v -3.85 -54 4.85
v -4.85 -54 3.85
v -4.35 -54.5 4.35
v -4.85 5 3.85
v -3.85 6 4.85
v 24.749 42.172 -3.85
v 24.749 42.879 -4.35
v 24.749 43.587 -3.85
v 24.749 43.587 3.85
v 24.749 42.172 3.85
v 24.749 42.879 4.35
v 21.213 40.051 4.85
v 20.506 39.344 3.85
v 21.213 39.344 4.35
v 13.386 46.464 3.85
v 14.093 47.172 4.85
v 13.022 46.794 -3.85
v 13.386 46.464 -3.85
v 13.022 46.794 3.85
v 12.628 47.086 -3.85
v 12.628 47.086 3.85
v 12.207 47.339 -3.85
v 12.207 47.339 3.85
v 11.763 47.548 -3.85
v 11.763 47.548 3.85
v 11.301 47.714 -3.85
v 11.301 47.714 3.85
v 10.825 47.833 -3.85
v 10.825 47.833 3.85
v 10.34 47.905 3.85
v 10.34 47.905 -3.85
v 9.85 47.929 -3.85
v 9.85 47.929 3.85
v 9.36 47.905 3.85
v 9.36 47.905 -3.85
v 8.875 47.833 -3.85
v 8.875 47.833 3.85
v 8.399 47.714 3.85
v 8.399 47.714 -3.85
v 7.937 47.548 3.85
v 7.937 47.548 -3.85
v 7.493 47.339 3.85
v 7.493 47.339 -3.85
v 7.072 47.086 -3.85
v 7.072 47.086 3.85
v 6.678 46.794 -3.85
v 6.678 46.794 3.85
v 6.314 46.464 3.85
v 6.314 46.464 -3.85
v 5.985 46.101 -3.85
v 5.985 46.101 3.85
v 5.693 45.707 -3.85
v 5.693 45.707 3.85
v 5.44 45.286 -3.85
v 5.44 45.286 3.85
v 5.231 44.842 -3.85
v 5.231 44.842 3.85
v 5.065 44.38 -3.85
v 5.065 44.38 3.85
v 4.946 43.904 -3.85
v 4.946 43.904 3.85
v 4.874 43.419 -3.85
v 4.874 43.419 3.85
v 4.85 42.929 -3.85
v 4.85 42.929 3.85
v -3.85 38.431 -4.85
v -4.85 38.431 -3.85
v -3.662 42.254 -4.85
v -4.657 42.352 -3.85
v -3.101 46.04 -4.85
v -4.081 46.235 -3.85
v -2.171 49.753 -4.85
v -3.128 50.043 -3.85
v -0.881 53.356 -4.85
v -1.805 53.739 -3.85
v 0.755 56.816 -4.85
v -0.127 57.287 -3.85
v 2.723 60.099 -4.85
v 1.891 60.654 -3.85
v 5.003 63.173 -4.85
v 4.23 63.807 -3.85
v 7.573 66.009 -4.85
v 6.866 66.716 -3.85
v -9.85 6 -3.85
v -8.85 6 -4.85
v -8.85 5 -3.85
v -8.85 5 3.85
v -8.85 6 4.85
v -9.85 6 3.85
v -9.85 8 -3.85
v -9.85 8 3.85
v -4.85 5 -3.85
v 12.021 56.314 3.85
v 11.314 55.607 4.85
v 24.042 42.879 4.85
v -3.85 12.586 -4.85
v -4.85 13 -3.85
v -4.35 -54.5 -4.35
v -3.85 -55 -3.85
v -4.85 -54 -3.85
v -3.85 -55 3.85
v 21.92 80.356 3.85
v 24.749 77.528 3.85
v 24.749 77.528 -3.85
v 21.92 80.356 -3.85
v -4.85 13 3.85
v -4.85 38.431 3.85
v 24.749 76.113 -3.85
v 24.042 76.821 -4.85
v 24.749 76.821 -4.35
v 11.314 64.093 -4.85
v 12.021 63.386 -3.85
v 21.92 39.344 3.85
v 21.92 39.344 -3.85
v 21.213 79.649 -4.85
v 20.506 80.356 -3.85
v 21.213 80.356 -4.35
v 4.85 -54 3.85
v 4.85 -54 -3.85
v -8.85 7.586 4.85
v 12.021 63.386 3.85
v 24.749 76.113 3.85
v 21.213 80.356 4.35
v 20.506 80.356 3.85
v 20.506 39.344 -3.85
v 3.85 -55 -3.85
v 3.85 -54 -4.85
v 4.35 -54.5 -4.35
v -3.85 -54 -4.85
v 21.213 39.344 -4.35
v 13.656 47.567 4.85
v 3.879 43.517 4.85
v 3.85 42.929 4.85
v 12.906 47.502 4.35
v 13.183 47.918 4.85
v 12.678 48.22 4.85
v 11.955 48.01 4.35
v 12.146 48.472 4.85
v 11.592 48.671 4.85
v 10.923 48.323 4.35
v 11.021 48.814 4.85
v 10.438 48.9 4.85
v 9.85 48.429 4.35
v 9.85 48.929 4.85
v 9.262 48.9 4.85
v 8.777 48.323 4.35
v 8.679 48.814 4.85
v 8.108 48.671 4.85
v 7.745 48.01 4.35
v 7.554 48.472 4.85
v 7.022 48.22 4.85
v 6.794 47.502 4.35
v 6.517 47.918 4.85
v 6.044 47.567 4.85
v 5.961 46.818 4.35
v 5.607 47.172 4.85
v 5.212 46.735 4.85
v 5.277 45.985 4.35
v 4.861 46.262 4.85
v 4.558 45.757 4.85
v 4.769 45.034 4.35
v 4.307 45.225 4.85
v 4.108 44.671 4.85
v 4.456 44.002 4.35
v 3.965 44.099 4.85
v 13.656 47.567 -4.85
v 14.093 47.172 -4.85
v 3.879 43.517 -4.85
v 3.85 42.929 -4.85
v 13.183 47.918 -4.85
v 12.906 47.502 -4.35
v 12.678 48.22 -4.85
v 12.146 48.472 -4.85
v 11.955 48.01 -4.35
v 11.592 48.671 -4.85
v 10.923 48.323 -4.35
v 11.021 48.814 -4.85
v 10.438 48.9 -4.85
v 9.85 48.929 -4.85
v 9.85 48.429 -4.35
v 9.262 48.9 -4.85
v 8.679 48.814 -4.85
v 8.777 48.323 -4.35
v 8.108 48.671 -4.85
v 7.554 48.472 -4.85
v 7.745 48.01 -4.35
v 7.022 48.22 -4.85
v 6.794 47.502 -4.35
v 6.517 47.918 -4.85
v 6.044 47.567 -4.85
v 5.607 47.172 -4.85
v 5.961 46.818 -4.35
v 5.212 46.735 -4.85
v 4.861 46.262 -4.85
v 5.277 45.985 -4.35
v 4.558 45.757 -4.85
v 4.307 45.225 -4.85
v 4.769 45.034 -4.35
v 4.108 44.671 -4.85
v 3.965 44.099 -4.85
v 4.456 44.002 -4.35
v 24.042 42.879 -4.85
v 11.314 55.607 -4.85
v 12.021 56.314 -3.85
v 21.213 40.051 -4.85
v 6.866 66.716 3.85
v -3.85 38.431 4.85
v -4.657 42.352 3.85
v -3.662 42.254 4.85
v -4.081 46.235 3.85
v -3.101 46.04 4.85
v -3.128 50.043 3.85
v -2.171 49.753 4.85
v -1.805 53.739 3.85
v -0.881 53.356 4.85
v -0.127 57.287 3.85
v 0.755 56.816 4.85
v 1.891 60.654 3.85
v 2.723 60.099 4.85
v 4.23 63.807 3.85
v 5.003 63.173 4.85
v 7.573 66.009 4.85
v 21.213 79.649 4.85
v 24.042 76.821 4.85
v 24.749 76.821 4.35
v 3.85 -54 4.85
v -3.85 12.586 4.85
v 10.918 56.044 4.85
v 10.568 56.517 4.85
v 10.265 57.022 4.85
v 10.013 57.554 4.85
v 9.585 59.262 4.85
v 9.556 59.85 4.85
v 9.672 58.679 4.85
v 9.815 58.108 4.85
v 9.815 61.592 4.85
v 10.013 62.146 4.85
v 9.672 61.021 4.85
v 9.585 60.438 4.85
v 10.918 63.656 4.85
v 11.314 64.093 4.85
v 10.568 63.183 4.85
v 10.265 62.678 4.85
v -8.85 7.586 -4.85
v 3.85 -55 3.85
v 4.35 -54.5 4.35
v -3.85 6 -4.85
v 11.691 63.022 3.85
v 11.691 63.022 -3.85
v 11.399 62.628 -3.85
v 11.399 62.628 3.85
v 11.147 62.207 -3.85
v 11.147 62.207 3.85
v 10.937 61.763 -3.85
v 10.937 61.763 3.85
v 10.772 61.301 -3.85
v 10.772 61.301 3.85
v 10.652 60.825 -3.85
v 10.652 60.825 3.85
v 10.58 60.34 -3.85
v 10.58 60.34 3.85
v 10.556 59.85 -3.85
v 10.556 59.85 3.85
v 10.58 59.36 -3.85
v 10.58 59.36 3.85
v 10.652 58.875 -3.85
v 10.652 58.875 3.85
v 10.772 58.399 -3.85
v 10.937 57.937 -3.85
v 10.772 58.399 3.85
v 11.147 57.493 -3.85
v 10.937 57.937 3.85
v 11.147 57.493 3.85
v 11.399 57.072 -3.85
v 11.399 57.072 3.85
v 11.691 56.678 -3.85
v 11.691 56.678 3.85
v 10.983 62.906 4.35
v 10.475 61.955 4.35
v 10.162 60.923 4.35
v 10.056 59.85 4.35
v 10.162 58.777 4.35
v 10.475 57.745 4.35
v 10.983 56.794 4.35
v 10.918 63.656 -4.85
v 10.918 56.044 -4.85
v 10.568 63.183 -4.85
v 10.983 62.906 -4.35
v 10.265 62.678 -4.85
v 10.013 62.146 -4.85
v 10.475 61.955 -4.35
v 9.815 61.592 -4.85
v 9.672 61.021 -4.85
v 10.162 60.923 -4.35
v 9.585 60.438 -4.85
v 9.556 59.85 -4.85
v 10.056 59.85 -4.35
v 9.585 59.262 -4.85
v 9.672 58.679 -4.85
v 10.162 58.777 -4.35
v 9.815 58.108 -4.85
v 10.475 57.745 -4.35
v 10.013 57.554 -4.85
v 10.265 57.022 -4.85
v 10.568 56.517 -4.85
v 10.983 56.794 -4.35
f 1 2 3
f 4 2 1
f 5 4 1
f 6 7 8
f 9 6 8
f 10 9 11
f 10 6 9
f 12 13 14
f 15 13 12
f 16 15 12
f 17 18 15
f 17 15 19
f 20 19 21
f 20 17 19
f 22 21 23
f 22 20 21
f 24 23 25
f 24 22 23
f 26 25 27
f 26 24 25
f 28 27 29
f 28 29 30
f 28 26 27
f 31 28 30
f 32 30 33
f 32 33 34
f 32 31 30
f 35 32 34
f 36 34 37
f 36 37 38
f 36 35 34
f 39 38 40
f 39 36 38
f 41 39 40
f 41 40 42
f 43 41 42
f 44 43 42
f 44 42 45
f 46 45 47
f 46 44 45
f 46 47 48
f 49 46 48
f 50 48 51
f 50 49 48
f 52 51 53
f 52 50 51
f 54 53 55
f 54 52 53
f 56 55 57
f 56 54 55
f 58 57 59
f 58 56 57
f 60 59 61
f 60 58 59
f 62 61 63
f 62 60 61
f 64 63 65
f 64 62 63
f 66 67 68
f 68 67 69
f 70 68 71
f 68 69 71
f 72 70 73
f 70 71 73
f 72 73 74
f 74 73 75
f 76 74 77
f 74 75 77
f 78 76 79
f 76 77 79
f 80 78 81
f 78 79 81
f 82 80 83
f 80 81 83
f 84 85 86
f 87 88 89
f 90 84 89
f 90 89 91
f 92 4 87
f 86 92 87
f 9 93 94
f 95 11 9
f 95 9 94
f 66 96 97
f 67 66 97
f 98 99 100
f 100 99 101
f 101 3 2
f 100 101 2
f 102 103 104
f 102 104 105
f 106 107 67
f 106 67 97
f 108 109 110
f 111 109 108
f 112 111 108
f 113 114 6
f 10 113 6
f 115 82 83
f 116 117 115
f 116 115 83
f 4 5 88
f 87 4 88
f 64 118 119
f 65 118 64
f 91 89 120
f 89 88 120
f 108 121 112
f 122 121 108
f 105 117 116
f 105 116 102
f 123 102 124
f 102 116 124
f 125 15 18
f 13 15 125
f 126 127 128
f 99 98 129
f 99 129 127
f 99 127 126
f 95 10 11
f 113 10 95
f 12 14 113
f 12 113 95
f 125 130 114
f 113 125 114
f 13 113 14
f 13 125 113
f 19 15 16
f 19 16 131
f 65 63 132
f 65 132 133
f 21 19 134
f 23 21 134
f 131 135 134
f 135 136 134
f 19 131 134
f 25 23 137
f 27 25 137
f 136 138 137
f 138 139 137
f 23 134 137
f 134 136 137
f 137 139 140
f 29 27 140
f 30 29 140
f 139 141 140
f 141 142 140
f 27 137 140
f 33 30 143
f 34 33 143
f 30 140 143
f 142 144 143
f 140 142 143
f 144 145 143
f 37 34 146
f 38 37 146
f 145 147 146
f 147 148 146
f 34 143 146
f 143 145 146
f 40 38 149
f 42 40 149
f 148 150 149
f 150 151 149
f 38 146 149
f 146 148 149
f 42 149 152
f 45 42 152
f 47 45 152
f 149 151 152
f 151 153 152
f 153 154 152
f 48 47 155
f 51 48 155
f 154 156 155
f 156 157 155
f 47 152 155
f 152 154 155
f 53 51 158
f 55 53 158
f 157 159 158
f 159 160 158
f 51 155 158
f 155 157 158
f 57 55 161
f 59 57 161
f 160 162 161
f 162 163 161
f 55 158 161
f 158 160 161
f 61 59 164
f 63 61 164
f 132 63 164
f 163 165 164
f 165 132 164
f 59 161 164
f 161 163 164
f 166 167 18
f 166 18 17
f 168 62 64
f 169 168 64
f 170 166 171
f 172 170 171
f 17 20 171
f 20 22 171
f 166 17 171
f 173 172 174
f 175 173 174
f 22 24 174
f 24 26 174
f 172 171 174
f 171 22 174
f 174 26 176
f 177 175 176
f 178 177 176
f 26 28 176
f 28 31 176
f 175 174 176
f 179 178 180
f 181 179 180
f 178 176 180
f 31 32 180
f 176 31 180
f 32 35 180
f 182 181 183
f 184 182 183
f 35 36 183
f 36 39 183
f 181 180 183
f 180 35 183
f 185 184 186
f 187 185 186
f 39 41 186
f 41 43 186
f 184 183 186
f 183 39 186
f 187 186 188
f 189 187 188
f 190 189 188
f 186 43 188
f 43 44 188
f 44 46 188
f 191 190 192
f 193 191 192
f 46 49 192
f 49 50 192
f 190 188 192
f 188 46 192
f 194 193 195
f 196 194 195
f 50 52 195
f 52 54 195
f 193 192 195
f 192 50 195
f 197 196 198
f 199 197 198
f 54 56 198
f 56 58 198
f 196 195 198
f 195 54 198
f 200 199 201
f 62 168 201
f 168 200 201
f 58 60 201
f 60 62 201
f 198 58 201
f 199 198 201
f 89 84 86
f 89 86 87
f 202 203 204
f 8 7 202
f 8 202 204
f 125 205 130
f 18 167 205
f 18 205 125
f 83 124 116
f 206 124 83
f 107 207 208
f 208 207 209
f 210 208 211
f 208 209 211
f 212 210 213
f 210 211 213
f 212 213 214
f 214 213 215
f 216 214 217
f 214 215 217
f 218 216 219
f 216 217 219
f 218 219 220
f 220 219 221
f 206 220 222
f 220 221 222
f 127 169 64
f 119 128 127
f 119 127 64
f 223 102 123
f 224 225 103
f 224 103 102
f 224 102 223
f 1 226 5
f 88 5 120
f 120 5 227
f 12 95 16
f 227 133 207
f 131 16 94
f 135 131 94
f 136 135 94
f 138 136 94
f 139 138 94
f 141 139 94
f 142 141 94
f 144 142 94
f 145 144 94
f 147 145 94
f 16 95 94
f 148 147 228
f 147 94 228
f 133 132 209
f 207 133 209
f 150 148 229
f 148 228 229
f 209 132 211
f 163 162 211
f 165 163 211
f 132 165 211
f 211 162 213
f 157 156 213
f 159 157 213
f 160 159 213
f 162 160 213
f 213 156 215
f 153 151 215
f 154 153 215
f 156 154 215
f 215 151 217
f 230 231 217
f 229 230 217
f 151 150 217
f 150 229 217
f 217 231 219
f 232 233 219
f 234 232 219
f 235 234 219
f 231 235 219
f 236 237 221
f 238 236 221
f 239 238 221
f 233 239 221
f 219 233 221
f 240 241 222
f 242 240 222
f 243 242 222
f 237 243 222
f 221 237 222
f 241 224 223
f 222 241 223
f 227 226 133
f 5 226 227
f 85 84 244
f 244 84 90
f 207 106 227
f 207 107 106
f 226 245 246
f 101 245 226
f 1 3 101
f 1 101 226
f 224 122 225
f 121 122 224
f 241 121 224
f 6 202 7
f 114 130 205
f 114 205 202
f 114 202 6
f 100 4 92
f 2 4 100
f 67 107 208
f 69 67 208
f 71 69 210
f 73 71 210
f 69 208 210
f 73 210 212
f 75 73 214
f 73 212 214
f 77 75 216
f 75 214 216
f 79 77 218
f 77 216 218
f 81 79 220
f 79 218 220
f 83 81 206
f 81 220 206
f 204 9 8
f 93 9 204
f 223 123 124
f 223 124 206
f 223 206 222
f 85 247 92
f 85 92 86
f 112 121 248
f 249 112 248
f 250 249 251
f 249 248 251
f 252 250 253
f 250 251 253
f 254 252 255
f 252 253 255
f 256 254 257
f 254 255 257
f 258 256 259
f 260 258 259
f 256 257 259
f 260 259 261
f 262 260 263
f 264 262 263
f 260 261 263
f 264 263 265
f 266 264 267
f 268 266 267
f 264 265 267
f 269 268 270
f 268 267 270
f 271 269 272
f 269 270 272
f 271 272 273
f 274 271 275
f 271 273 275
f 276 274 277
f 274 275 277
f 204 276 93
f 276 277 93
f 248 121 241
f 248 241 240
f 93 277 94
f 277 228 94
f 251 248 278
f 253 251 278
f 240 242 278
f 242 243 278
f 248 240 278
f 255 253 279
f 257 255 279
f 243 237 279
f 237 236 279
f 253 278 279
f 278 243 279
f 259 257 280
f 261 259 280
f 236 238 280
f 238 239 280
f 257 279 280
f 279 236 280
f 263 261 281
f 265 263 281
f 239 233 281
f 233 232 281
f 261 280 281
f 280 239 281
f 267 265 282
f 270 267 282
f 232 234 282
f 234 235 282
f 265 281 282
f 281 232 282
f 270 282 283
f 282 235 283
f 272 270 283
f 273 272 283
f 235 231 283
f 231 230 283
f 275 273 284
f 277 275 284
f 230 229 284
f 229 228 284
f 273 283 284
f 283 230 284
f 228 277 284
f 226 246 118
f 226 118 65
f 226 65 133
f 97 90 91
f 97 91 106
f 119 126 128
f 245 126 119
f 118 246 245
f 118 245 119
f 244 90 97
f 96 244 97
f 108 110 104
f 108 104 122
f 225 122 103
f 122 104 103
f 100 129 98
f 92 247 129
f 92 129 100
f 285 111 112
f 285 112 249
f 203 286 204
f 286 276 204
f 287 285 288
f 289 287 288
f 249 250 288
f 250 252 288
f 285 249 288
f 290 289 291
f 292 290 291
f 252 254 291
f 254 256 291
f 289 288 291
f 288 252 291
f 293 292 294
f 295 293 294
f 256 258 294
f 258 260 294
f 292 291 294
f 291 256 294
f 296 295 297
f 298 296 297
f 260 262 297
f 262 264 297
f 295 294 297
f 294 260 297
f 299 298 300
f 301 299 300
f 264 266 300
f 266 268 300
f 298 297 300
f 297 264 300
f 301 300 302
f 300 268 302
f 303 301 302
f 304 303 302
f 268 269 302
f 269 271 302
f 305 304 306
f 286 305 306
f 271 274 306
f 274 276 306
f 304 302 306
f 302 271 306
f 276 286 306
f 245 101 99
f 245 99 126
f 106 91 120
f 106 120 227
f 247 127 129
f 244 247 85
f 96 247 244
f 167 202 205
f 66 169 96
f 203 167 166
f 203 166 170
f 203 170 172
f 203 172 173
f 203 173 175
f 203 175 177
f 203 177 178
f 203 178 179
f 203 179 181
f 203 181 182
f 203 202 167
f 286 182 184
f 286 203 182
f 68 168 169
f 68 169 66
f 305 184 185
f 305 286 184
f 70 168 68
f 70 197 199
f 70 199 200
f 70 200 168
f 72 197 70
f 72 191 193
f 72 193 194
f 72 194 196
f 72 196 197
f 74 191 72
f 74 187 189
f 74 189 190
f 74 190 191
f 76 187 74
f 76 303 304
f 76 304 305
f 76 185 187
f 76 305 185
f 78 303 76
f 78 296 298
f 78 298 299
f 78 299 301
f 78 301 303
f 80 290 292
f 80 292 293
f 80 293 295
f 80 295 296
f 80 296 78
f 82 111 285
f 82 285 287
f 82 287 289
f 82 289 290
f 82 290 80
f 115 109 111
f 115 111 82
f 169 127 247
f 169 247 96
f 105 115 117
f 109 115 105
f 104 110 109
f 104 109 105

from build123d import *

# Parameters (mm, degrees)
BOSS_EXTRUDE1_DEPTH = 4.85
FILLET1_R           = 5
FILLET2_R           = 40
FILLET3_R           = 5
CHAMFER1_SIZE       = 1
CHAMFER2_SIZE       = 1
CHAMFER3_SIZE       = 1
BOSS_EXTRUDE2_START = -9.7
BOSS_EXTRUDE2_DEPTH = 9.7
CHAMFER4_SIZE       = 1


with BuildPart() as part:
    # Sketch1 → Boss-Extrude1 (new, symmetric)
    with BuildSketch(Plane.XY):
        Polygon((4.85, 55), (21.213203436, 38.636796564), (25.455844123, 42.879437252), (8.485281374, 59.85), (25.455844123, 76.820562748), (21.213203436, 81.063203436), (-4.85, 55), (-4.85, -55), (4.85, -55), align=None)
    extrude(amount=BOSS_EXTRUDE1_DEPTH, both=True)

    # Fillet1
    fillet1_edges = [part.edges().sort_by_distance(p)[0] for p in [
        (4.85, 55, 0),
    ]]
    fillet(fillet1_edges, radius=FILLET1_R)

    # Fillet2
    fillet2_edges = [part.edges().sort_by_distance(p)[0] for p in [
        (-4.85, 55, 0),
    ]]
    fillet(fillet2_edges, radius=FILLET2_R)

    # Fillet3
    fillet3_edges = [part.edges().sort_by_distance(p)[0] for p in [
        (8.485281374, 59.85, 0),
    ]]
    fillet(fillet3_edges, radius=FILLET3_R)

    # Chamfer1
    chamfer1_edges = [part.edges().sort_by_distance(p)[0] for p in [
        (21.213203436, 81.063203436, 0),
        (25.455844123, 76.820562748, 0),
        (25.455844123, 42.879437252, 0),
        (21.213203436, 38.636796564, 0),
    ]]
    chamfer(chamfer1_edges, length=CHAMFER1_SIZE)

    # Chamfer2
    # the kernel refuses this chamfer: 1 mm, written as the material it takes off along each edge
    with BuildSketch(Plane(origin=(-4.85, 38.431457505, -4.85), x_dir=(0.9996219169112968, 0, -0.027495876610586487), z_dir=(0, -1, 0)), Plane(origin=(-4.85, 38.431457505, 4.85), x_dir=(-0.027495876610586487, 0, -0.9996219169112968), z_dir=(0, -1, 0))) as chamfer2_piece_1:
        Polygon((CHAMFER2_SIZE * 0.999621916911, CHAMFER2_SIZE * 0.0274958766106), (-CHAMFER2_SIZE * 0.0274958766106, CHAMFER2_SIZE * 0.999621916911), (0, 0), align=None)
    extrude(amount=96.003140493, mode=Mode.SUBTRACT)
    with BuildSketch(Plane(origin=(35.15, 38.431457505, -4.85), x_dir=(-1, 0, 0), z_dir=(0, -1, 0))) as chamfer2_piece_2:
        Polygon((40 - CHAMFER2_SIZE, 0), (40, -CHAMFER2_SIZE), (40, 0), align=None)
    revolve(axis=Axis((35.15, 38.431457505, -4.85), (0, 0, -1)), revolution_arc=45, mode=Mode.SUBTRACT)
    with BuildSketch(Plane(origin=(22.324551134, 82.174551134, -4.85), x_dir=(0.7068394360706736, -0.7068394360706733, -0.027495876610586494), z_dir=(-0.7071067811865475, -0.7071067811865477, 0)), Plane(origin=(22.324551134, 82.174551134, 4.85), x_dir=(-0.019442520806010343, 0.019442520806010336, -0.999621916911297), z_dir=(-0.7071067811865475, -0.7071067811865477, 0))) as chamfer2_piece_3:
        Polygon((CHAMFER2_SIZE * 0.999621916911, CHAMFER2_SIZE * 0.0274958766106), (-CHAMFER2_SIZE * 0.0274958766106, CHAMFER2_SIZE * 0.999621916911), (0, 0), align=None)
    extrude(amount=21.862076271, mode=Mode.SUBTRACT)
    with BuildSketch(Plane(origin=(26.567191821, 75.70921505, -4.85), x_dir=(-0.7068394360706752, -0.7068394360706718, -0.02749587661058676), z_dir=(-0.7071067811865458, 0.7071067811865493, 0)), Plane(origin=(26.567191821, 75.70921505, 4.85), x_dir=(0.019442520806010388, 0.019442520806010295, -0.999621916911297), z_dir=(-0.7071067811865458, 0.7071067811865493, 0)), Plane(origin=(20.101855737, 37.525448866, -4.85), x_dir=(-0.7068394360706738, 0.7068394360706732, -0.027495876610586494), z_dir=(0.7071067811865472, 0.7071067811865478, 0)), Plane(origin=(20.101855737, 37.525448866, 4.85), x_dir=(0.019442520806015523, -0.01944252080601551, -0.9996219169112968), z_dir=(0.7071067811865472, 0.7071067811865478, 0))) as chamfer2_piece_4:
        Polygon((CHAMFER2_SIZE * 0.999621916911, CHAMFER2_SIZE * 0.0274958766106), (-CHAMFER2_SIZE * 0.0274958766106, CHAMFER2_SIZE * 0.999621916911), (0, 0), align=None)
    extrude(amount=9.143365976, mode=Mode.SUBTRACT)
    with BuildSketch(Plane(origin=(35.15, 38.431457505, 4.85), x_dir=(-1, 0, 0), z_dir=(0, -1, 0))) as chamfer2_piece_5:
        Polygon((40, CHAMFER2_SIZE), (40 - CHAMFER2_SIZE, 0), (40, 0), align=None)
    revolve(axis=Axis((35.15, 38.431457505, 4.85), (0, 0, -1)), revolution_arc=45, mode=Mode.SUBTRACT)
    with BuildSketch(Plane(origin=(12.02081528, 63.385533906, 4.85), x_dir=(0.019442520806015513, -0.01944252080601552, -0.9996219169112968), z_dir=(0.7071067811865476, 0.7071067811865475, 0)), Plane(origin=(26.567191821, 41.768089553, 4.85), x_dir=(0.019442520806015516, 0.019442520806015516, -0.9996219169112968), z_dir=(-0.7071067811865476, 0.7071067811865476, 0)), Plane(origin=(12.02081528, 63.385533906, -4.85), x_dir=(-0.7068394360706736, 0.7068394360706736, -0.027495876610586462), z_dir=(0.7071067811865476, 0.7071067811865475, 0)), Plane(origin=(26.567191821, 41.768089553, -4.85), x_dir=(-0.7068394360706735, -0.7068394360706735, -0.027495876610586494), z_dir=(-0.7071067811865476, 0.7071067811865476, 0))) as chamfer2_piece_6:
        Polygon((CHAMFER2_SIZE * 0.999621916911, CHAMFER2_SIZE * 0.0274958766106), (-CHAMFER2_SIZE * 0.0274958766106, CHAMFER2_SIZE * 0.999621916911), (0, 0), align=None)
    extrude(amount=20.571682988, mode=Mode.SUBTRACT)
    with BuildSketch(Plane(origin=(15.556349186, 59.85, 4.85), x_dir=(-0.7071067811865474, 0.7071067811865477, 0), z_dir=(0.7071067811865477, 0.7071067811865474, 0))) as chamfer2_piece_7:
        Polygon((5, -CHAMFER2_SIZE), (5 + CHAMFER2_SIZE, 0), (5, 0), align=None)
    revolve(axis=Axis((15.556349186, 59.85, 4.85), (0, 0, 1)), revolution_arc=90, mode=Mode.SUBTRACT)
    with BuildSketch(Plane(origin=(15.556349186, 59.85, -4.85), x_dir=(-0.7071067811865474, 0.7071067811865477, 0), z_dir=(0.7071067811865477, 0.7071067811865474, 0))) as chamfer2_piece_8:
        Polygon((5 + CHAMFER2_SIZE, 0), (5, CHAMFER2_SIZE), (5, 0), align=None)
    revolve(axis=Axis((15.556349186, 59.85, -4.85), (0, 0, 1)), revolution_arc=90, mode=Mode.SUBTRACT)
    with BuildSketch(Plane(origin=(13.385533906, 46.464466094, -4.85), x_dir=(0.7068394360706735, 0.7068394360706737, -0.027495876610586462), z_dir=(0.7071067811865477, -0.7071067811865474, 0)), Plane(origin=(13.385533906, 46.464466094, 4.85), x_dir=(-0.019442520806016373, -0.01944252080601638, -0.9996219169112965), z_dir=(0.7071067811865477, -0.7071067811865474, 0))) as chamfer2_piece_9:
        Polygon((CHAMFER2_SIZE * 0.999621916911, CHAMFER2_SIZE * 0.0274958766106), (-CHAMFER2_SIZE * 0.0274958766106, CHAMFER2_SIZE * 0.999621916911), (0, 0), align=None)
    extrude(amount=12.641679399, mode=Mode.SUBTRACT)
    with BuildSketch(Plane(origin=(9.85, 42.928932188, -4.85), x_dir=(0.7071067811865479, 0.7071067811865471, 0), z_dir=(0.7071067811865471, -0.7071067811865479, 0))) as chamfer2_piece_10:
        Polygon((5 + CHAMFER2_SIZE, 0), (5, CHAMFER2_SIZE), (5, 0), align=None)
    revolve(axis=Axis((9.85, 42.928932188, -4.85), (0, 0, 1)), revolution_arc=135, mode=Mode.SUBTRACT)
    with BuildSketch(Plane(origin=(4.85, -57.571682988, -4.85), x_dir=(-0.9996219169112968, 0, -0.027495876610586487), z_dir=(0, 1, 0)), Plane(origin=(4.85, -57.571682988, 4.85), x_dir=(0.027495876610586487, 0, -0.9996219169112968), z_dir=(0, 1, 0))) as chamfer2_piece_11:
        Polygon((CHAMFER2_SIZE * 0.999621916911, CHAMFER2_SIZE * 0.0274958766106), (-CHAMFER2_SIZE * 0.0274958766106, CHAMFER2_SIZE * 0.999621916911), (0, 0), align=None)
    extrude(amount=100.500615176, mode=Mode.SUBTRACT)
    with BuildSketch(Plane(origin=(9.85, 42.928932188, 4.85), x_dir=(0.7071067811865479, 0.7071067811865471, 0), z_dir=(0.7071067811865471, -0.7071067811865479, 0))) as chamfer2_piece_12:
        Polygon((5, -CHAMFER2_SIZE), (5 + CHAMFER2_SIZE, 0), (5, 0), align=None)
    revolve(axis=Axis((9.85, 42.928932188, 4.85), (0, 0, 1)), revolution_arc=135, mode=Mode.SUBTRACT)

    # Chamfer3
    # the kernel refuses this chamfer: 1 mm, written as the material it takes off along each edge
    with BuildSketch(Plane(origin=(4.85, -55, 6.421682988), x_dir=(-0.9996219169112968, -0.027495876610589075, 0), z_dir=(0, 0, -1)), Plane(origin=(-6.421682988, -55, 4.85), x_dir=(0, -0.02749587661058907, -0.9996219169112965), z_dir=(1, 0, 0)), Plane(origin=(-6.421682988, -55, -4.85), x_dir=(0, 0.9996219169112968, -0.027495876610586414), z_dir=(1, 0, 0))) as chamfer3_piece_1:
        Polygon((CHAMFER3_SIZE * 0.999621916911, CHAMFER3_SIZE * 0.0274958766106), (-CHAMFER3_SIZE * 0.0274958766106, CHAMFER3_SIZE * 0.999621916911), (0, 0), align=None)
    extrude(amount=12.843365976, mode=Mode.SUBTRACT)
    with BuildSketch(Plane(origin=(-4.85, -55, 6.421682988), x_dir=(0.9996219169112968, -0.027495876610589075, 0), z_dir=(0, 0, -1))) as chamfer3_piece_2:
        Polygon((CHAMFER3_SIZE * 0.999621916911, -CHAMFER3_SIZE * 0.0274958766106), (-CHAMFER3_SIZE * 0.0274958766106, -CHAMFER3_SIZE * 0.999621916911), (0, 0), align=None)
    extrude(amount=12.843365976, mode=Mode.SUBTRACT)

    # Sketch2 → Boss-Extrude2 (add)
    with BuildSketch(Plane.XY.offset(4.85).offset(BOSS_EXTRUDE2_START)):
        Polygon((-3.85, 5), (-9.85, 5), (-9.85, 8), (-3.85, 14), align=None)
    extrude(amount=BOSS_EXTRUDE2_DEPTH)

    # Chamfer4
    chamfer4_edges = [part.edges().sort_by_distance(p)[0] for p in [
        (-6.85, 11, 4.85),
        (-9.85, 6.5, 4.85),
        (-6.85, 5, 4.85),
        (-6.85, 11, -4.85),
        (-9.85, 6.5, -4.85),
        (-6.85, 5, -4.85),
        (-9.85, 5, 0),
    ]]
    chamfer(chamfer4_edges, length=CHAMFER4_SIZE)


solid = part.part
